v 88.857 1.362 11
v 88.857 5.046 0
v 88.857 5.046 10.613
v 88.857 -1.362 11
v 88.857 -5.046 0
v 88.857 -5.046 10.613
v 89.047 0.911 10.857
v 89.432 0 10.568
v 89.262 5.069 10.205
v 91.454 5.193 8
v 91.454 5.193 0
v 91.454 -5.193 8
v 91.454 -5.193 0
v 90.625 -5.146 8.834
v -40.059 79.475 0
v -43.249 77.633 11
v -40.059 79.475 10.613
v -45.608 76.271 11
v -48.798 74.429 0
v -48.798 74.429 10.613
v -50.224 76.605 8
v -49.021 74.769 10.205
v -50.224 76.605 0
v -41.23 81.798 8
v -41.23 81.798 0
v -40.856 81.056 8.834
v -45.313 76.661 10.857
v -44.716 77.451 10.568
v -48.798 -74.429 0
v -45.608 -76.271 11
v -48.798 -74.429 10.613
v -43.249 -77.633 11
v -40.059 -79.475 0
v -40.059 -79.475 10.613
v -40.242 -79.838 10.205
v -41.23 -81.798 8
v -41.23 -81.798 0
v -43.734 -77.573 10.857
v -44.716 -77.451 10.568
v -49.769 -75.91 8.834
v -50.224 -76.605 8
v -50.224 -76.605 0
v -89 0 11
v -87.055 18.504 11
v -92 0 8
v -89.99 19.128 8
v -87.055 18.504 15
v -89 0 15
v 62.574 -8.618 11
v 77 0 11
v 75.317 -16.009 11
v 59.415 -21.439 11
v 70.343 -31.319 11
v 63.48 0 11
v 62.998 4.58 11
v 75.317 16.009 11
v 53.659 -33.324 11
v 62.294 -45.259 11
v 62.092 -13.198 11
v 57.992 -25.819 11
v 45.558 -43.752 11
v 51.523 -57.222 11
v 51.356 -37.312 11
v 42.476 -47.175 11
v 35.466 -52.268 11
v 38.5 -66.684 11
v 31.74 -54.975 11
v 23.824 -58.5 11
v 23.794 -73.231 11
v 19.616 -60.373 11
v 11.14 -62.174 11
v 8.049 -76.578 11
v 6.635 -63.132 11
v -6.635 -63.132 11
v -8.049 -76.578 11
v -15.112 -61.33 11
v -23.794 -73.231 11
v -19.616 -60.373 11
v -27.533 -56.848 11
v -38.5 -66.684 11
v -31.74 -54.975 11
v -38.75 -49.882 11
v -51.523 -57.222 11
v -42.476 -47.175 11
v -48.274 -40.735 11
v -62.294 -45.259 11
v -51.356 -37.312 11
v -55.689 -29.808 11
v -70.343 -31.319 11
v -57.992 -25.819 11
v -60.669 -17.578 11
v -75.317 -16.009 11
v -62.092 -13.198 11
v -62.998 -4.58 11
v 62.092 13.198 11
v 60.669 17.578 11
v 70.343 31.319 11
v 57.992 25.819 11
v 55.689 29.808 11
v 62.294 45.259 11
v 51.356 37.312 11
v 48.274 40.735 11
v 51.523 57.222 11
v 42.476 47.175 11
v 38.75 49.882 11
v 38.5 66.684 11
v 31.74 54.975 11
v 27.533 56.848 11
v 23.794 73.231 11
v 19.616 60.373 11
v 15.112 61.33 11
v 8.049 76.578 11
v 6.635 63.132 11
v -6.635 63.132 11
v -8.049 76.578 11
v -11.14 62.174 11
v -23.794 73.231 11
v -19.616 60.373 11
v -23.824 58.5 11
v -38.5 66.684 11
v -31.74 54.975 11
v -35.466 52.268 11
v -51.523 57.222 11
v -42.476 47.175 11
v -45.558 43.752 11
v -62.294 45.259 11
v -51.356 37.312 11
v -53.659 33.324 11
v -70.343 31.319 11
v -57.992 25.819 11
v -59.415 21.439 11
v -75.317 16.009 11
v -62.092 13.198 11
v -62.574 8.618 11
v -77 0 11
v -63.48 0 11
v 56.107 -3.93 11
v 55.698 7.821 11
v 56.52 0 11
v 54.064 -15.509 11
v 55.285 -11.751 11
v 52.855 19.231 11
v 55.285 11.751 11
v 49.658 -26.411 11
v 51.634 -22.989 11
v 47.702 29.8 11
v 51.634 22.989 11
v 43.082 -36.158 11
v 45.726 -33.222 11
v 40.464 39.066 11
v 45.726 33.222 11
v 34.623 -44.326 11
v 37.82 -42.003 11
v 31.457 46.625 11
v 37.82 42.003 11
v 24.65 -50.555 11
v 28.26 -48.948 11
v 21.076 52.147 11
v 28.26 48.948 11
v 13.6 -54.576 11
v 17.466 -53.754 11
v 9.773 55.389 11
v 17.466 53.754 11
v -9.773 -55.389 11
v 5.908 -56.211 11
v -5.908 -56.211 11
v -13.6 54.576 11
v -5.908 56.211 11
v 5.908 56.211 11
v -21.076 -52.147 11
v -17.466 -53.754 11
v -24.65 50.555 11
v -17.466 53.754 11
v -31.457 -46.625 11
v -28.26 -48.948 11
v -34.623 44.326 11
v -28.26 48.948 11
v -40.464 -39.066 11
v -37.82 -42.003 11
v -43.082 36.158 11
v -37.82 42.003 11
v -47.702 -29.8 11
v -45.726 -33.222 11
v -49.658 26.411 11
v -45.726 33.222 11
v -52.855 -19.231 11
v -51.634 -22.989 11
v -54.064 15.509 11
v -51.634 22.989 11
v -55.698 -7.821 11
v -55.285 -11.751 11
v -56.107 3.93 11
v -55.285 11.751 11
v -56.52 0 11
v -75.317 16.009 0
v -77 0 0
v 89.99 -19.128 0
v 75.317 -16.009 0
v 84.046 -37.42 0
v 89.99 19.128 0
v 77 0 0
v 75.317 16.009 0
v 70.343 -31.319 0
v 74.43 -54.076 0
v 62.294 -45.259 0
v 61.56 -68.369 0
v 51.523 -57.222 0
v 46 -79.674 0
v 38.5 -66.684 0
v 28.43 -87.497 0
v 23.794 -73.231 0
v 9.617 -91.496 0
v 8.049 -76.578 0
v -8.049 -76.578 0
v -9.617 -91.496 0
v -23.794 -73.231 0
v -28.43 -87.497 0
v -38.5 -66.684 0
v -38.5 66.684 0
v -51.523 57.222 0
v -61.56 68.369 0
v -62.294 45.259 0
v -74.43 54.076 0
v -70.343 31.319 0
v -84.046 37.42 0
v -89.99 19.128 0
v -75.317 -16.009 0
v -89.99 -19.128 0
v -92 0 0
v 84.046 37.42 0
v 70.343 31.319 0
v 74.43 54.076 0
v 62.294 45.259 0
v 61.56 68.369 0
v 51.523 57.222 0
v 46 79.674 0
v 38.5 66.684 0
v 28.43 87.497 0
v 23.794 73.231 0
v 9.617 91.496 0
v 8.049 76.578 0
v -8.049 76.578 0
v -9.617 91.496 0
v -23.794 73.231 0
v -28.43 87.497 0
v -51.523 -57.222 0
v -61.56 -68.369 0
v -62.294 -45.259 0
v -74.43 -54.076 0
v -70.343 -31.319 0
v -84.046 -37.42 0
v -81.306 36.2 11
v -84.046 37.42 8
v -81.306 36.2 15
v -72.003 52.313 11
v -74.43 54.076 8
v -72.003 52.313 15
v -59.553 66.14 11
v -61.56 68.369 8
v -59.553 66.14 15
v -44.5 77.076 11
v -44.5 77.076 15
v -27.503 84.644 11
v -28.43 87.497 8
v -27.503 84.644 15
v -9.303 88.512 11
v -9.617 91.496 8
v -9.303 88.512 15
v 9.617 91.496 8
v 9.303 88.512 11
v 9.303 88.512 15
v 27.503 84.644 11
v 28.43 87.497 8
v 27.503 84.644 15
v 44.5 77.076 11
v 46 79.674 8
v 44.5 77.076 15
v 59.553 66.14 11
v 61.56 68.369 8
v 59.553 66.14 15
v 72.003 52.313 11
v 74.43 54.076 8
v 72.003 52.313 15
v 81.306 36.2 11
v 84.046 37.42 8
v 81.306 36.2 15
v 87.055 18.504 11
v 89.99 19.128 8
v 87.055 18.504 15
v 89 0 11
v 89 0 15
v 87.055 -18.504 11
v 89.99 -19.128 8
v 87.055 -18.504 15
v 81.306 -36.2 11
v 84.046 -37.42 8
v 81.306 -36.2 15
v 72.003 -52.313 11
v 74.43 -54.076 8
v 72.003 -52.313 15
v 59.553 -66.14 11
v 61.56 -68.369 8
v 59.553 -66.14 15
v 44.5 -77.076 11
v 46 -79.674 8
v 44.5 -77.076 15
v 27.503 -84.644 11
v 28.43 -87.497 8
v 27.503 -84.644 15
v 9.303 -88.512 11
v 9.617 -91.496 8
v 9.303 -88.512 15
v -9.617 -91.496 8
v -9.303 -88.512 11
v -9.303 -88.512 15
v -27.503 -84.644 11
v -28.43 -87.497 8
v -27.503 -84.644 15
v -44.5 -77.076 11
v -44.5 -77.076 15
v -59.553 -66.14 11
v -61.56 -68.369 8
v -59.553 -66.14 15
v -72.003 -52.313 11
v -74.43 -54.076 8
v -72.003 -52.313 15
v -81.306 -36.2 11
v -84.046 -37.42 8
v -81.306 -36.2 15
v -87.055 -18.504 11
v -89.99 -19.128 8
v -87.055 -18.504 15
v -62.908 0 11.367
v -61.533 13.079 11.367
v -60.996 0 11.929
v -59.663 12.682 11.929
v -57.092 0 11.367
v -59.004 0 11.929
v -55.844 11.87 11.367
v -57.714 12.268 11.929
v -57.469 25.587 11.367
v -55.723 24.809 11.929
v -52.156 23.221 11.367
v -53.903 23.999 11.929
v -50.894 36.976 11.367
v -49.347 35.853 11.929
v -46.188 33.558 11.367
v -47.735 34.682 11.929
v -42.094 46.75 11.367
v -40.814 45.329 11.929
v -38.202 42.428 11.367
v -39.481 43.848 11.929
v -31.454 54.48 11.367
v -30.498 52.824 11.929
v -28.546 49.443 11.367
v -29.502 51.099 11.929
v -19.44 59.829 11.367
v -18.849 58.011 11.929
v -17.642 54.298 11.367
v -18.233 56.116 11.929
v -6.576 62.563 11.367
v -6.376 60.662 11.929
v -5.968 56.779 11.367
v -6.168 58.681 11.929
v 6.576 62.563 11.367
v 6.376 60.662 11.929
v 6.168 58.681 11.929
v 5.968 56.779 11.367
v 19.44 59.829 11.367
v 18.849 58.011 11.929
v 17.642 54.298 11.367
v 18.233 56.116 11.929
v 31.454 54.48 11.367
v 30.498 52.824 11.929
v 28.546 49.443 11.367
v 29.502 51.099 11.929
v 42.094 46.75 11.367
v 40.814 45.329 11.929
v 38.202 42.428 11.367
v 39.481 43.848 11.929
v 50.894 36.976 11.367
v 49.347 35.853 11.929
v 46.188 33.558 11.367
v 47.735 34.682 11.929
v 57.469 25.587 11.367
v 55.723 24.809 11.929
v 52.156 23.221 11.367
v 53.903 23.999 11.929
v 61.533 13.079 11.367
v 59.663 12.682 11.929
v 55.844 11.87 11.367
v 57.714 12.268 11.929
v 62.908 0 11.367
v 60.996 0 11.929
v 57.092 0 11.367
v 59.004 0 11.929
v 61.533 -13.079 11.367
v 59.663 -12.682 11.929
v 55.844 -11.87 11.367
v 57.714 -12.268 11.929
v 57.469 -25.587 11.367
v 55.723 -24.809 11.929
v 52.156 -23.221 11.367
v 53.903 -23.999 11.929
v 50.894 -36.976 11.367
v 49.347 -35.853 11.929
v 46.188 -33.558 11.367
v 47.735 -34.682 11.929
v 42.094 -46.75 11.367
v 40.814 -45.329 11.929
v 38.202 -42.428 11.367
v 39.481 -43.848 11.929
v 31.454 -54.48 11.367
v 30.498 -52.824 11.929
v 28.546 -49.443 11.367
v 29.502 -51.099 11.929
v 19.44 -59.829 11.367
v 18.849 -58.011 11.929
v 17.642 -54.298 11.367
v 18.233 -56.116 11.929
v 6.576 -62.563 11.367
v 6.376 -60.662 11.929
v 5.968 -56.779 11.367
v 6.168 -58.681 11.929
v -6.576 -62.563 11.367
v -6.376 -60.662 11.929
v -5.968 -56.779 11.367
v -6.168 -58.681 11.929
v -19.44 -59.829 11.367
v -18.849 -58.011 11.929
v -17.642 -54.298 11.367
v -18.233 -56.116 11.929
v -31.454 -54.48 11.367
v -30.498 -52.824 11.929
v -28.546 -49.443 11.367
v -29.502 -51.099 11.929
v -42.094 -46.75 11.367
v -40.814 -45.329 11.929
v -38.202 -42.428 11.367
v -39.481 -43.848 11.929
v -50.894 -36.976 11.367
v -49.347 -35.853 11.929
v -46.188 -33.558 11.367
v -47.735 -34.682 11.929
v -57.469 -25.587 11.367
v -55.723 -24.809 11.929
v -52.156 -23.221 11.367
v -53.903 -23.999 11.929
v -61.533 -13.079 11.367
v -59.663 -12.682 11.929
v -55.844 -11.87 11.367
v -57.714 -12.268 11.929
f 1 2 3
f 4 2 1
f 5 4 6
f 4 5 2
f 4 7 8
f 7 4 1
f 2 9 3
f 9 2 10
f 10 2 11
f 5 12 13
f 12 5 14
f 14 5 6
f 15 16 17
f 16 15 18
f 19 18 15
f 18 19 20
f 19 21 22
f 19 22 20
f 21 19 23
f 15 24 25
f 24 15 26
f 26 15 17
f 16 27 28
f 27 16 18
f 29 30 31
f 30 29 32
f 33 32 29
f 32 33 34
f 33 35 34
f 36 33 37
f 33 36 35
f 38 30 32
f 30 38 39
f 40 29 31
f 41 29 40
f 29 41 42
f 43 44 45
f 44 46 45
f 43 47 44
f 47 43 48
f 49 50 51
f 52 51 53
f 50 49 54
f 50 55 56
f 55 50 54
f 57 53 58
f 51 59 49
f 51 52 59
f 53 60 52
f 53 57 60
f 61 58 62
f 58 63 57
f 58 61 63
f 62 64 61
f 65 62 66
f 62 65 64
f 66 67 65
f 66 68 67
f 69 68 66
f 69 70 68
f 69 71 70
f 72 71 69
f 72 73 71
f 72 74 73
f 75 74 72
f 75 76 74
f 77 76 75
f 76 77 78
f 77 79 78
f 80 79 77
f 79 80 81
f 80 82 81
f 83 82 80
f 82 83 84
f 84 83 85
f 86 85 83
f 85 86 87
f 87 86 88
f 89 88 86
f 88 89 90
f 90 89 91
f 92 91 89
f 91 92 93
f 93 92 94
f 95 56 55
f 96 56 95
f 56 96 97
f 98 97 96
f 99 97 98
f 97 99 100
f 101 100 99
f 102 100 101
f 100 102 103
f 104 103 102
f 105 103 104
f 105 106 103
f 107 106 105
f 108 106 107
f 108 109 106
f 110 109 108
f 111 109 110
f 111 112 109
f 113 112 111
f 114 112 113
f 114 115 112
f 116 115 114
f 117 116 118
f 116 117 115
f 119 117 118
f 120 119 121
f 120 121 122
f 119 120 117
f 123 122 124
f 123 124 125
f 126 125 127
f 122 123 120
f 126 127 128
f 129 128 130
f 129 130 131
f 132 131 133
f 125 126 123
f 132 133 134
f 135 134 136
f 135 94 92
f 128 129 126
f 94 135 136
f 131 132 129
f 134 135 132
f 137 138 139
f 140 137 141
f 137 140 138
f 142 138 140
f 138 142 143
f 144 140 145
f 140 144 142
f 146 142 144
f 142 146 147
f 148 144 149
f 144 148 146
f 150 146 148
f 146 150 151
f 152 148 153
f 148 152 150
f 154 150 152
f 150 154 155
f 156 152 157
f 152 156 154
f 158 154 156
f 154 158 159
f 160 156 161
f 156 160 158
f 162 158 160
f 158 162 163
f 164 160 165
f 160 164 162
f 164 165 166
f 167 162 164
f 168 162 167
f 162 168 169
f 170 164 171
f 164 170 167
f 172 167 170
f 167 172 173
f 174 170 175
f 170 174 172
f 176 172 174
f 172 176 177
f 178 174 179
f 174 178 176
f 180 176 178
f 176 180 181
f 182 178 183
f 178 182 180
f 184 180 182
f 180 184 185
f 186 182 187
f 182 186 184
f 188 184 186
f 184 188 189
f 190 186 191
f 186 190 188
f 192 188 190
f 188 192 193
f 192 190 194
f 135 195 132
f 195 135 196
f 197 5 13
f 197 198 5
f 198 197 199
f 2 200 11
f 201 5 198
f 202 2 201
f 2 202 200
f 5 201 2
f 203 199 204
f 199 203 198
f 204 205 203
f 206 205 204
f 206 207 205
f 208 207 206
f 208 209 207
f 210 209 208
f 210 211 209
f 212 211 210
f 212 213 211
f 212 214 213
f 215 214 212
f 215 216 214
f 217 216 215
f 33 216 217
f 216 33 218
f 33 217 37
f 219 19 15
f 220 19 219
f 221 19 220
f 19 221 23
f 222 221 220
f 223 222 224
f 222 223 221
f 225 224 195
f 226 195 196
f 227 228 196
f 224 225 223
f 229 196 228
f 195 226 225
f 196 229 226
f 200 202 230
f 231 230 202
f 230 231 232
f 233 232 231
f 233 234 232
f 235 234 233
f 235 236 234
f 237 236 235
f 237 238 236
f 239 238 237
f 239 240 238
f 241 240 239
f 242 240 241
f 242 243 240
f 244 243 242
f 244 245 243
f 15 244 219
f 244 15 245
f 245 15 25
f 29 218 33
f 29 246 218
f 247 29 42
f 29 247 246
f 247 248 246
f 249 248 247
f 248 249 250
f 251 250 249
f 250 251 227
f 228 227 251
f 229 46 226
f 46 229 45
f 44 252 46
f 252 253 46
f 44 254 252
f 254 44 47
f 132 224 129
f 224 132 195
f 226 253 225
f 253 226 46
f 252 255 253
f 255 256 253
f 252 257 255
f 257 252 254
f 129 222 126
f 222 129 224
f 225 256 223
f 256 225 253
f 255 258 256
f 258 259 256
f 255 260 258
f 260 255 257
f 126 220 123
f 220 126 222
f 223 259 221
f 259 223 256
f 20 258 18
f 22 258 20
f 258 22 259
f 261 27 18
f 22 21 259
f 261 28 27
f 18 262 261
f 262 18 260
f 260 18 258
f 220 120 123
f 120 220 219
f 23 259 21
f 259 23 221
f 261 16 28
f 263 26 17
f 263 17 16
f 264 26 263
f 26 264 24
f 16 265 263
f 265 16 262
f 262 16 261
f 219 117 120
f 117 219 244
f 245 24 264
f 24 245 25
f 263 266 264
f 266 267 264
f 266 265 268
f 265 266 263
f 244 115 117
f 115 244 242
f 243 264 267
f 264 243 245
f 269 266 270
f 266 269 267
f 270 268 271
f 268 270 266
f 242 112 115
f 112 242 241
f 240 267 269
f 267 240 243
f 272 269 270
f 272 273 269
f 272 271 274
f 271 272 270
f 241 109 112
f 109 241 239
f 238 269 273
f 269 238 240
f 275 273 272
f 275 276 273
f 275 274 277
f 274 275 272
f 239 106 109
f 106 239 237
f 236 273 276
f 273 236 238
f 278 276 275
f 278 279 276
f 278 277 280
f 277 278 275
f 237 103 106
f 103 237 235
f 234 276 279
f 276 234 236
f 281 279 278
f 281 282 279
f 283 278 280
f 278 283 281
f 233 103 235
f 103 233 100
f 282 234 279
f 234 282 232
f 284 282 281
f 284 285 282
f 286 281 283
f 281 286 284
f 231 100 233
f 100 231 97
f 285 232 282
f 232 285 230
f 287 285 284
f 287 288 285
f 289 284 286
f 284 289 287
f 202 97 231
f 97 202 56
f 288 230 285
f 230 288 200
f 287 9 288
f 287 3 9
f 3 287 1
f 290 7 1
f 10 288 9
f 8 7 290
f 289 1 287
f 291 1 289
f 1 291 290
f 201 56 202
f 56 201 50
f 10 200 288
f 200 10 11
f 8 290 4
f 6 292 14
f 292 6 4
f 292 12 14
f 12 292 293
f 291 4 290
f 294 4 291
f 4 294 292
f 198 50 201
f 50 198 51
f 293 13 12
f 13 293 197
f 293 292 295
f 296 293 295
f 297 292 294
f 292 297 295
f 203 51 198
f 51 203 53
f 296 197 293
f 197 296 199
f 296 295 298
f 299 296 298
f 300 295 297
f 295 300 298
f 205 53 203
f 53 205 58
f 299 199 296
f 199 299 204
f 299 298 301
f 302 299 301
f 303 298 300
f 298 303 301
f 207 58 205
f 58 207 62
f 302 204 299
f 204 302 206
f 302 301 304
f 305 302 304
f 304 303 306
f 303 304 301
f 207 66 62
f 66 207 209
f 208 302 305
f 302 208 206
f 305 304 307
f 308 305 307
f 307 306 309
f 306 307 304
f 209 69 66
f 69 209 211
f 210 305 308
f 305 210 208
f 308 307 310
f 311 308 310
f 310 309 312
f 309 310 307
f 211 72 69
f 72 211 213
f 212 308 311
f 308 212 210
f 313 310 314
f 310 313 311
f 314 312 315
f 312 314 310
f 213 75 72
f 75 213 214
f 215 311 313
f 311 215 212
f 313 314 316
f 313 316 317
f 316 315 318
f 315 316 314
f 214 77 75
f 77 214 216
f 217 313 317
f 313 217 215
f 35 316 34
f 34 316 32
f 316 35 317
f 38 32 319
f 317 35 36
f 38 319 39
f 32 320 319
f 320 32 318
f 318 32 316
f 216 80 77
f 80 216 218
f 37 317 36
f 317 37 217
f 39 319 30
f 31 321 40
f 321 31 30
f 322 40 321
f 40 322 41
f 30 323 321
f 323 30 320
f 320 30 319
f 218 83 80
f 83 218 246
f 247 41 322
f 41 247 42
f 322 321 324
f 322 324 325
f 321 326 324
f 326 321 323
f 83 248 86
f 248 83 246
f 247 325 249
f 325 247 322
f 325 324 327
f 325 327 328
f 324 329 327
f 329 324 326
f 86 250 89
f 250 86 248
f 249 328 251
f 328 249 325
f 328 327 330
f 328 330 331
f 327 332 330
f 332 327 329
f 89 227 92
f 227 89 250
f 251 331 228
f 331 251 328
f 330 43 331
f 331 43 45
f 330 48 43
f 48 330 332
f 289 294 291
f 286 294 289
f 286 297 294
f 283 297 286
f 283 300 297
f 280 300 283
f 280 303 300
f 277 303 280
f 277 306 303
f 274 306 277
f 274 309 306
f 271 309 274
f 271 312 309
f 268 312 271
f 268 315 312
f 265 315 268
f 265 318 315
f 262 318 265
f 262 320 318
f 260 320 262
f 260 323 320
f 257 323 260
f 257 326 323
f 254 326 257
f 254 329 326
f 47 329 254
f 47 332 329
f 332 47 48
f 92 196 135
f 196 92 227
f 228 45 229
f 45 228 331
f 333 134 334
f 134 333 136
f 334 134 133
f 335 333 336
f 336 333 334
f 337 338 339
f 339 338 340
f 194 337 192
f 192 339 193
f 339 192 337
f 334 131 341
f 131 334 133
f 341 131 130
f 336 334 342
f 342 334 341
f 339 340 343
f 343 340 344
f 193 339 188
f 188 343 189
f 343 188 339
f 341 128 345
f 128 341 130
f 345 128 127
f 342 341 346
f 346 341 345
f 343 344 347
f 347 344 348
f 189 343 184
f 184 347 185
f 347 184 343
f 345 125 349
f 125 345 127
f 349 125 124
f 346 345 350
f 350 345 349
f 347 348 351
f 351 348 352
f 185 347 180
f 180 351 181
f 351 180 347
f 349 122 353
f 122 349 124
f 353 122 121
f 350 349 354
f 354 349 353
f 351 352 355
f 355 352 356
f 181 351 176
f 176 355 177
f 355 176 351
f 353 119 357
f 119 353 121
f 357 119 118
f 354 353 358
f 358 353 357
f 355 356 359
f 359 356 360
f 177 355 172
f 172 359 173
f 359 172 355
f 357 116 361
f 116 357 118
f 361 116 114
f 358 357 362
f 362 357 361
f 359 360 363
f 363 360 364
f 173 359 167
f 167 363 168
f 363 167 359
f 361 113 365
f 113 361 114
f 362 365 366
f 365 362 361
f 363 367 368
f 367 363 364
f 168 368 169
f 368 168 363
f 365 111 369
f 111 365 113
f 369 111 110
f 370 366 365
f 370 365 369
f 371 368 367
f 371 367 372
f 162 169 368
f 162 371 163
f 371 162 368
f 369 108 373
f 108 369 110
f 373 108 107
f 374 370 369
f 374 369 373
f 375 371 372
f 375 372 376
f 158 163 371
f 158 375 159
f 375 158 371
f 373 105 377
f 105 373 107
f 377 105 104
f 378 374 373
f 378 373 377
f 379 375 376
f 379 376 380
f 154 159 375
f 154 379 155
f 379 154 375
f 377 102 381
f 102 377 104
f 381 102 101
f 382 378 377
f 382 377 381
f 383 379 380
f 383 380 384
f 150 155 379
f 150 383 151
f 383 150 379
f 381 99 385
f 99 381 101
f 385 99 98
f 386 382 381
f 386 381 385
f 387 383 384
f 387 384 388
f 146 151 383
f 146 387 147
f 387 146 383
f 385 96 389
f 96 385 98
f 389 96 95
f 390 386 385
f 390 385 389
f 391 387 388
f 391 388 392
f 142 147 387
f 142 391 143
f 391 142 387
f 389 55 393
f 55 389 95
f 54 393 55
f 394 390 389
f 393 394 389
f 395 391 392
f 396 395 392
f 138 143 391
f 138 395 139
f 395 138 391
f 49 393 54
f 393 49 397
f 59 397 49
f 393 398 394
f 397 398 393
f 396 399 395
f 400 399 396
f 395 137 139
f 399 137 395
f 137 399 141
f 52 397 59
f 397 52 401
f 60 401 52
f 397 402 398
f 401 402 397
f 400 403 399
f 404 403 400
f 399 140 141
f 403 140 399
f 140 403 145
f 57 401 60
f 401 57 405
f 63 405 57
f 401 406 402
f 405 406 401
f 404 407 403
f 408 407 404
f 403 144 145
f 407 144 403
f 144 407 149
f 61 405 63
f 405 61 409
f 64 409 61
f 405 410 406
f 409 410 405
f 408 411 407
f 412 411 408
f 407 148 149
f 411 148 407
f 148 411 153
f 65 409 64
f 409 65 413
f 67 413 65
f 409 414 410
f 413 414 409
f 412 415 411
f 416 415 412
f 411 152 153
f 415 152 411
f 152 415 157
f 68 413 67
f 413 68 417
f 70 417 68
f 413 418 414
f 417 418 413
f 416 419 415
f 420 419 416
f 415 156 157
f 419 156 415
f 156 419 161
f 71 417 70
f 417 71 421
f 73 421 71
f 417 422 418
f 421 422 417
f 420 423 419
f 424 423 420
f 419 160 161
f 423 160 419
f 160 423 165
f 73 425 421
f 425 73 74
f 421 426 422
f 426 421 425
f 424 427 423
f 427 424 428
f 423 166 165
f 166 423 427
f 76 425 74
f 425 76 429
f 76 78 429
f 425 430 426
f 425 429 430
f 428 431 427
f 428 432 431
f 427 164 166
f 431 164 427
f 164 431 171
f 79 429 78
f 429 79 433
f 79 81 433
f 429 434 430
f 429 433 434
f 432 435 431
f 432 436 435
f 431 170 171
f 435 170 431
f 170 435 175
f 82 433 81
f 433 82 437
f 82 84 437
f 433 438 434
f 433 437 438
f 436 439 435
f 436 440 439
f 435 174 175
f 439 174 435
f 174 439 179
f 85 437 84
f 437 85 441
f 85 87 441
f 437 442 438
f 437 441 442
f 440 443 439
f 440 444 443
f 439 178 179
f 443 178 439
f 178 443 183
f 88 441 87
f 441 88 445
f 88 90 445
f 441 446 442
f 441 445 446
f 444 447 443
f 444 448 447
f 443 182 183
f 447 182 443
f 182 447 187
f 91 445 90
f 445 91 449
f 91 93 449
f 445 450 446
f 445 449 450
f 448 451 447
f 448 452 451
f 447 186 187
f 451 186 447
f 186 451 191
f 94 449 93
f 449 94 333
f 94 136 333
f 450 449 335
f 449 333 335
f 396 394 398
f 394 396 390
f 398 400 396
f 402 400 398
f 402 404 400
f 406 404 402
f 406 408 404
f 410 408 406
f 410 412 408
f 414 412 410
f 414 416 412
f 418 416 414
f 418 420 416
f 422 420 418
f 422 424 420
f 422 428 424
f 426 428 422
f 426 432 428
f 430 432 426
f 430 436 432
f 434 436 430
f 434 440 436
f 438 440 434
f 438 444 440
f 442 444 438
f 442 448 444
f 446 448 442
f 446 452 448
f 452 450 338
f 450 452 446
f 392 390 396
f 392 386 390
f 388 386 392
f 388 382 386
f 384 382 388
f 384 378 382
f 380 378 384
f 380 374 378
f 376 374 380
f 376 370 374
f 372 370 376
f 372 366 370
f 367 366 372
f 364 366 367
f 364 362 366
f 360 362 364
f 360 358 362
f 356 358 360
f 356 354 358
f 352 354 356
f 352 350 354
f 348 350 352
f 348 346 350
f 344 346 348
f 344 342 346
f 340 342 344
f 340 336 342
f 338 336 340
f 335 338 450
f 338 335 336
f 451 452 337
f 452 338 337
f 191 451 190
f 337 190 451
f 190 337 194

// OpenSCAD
// $fn=250;

// // set default value
// jogwheel_inner_rad = 90;
//
// inner_wall = 12;
// inner_thickness = 4;
// inner_height = 15;
//
// clearance = 1;
//
// tooth_depth = 3;
// tooth_height = 8;
// tooth_width = 6.5;  // this is an angle

// parameters based on input params

module jogwheel_inner(inner_params) {
    // unpack input params
    inner_rad = inner_params[0];
    inner_wall = inner_params[1];
    inner_thickness = inner_params[2];
    inner_height = inner_params[3];
    tooth_params = inner_params[4];
    bearing_grooves = inner_params[5];
    clearances = inner_params[6];

    tooth_depth = tooth_params[0];
    tooth_height = tooth_params[1];
    tooth_width = tooth_params[2];
    
    bearing_groove_dim = bearing_grooves[0];
    bearing_groove_depth = bearing_grooves[1];
    inner_bearing_groove_rad = bearing_grooves[2];

    clearance = clearances[0];

    part_inner_rad = inner_rad - clearance;

    difference() {

        rotate_extrude()
        polygon( points=[[0, inner_height],
            [part_inner_rad, inner_height],
            [part_inner_rad, inner_height-inner_thickness],
            [part_inner_rad+tooth_depth, tooth_height],
            [part_inner_rad+tooth_depth, 0],
            [part_inner_rad-inner_wall, 0],
            [part_inner_rad-inner_wall, inner_height-inner_thickness],
            [0, inner_height-inner_thickness]] );
                
        for ( i = [0 : 2] ) {
            rotate([0,0,i*120-tooth_width/2])
            rotate_extrude(angle=tooth_width)
            polygon( points=[[part_inner_rad, inner_height-inner_thickness],
                [part_inner_rad+tooth_depth+clearance, tooth_height],
                [part_inner_rad+tooth_depth+clearance, 0-clearance ],
                [part_inner_rad, 0-clearance]] );
        }


        rotate_extrude()
            translate([inner_bearing_groove_rad, bearing_groove_depth+inner_height-inner_thickness-bearing_groove_dim/2, 0])
            circle(d=bearing_groove_dim);
    }
}

// inner_params = [inner_rad, inner_wall, inner_thickness, inner_height, tooth_params, bearing_grooves, clearances];
inner_params = [90, 12, 4, 15, [3, 8, 6.5], [14, 1, 60, 90], [1, 5]];
jogwheel_inner(inner_params);
